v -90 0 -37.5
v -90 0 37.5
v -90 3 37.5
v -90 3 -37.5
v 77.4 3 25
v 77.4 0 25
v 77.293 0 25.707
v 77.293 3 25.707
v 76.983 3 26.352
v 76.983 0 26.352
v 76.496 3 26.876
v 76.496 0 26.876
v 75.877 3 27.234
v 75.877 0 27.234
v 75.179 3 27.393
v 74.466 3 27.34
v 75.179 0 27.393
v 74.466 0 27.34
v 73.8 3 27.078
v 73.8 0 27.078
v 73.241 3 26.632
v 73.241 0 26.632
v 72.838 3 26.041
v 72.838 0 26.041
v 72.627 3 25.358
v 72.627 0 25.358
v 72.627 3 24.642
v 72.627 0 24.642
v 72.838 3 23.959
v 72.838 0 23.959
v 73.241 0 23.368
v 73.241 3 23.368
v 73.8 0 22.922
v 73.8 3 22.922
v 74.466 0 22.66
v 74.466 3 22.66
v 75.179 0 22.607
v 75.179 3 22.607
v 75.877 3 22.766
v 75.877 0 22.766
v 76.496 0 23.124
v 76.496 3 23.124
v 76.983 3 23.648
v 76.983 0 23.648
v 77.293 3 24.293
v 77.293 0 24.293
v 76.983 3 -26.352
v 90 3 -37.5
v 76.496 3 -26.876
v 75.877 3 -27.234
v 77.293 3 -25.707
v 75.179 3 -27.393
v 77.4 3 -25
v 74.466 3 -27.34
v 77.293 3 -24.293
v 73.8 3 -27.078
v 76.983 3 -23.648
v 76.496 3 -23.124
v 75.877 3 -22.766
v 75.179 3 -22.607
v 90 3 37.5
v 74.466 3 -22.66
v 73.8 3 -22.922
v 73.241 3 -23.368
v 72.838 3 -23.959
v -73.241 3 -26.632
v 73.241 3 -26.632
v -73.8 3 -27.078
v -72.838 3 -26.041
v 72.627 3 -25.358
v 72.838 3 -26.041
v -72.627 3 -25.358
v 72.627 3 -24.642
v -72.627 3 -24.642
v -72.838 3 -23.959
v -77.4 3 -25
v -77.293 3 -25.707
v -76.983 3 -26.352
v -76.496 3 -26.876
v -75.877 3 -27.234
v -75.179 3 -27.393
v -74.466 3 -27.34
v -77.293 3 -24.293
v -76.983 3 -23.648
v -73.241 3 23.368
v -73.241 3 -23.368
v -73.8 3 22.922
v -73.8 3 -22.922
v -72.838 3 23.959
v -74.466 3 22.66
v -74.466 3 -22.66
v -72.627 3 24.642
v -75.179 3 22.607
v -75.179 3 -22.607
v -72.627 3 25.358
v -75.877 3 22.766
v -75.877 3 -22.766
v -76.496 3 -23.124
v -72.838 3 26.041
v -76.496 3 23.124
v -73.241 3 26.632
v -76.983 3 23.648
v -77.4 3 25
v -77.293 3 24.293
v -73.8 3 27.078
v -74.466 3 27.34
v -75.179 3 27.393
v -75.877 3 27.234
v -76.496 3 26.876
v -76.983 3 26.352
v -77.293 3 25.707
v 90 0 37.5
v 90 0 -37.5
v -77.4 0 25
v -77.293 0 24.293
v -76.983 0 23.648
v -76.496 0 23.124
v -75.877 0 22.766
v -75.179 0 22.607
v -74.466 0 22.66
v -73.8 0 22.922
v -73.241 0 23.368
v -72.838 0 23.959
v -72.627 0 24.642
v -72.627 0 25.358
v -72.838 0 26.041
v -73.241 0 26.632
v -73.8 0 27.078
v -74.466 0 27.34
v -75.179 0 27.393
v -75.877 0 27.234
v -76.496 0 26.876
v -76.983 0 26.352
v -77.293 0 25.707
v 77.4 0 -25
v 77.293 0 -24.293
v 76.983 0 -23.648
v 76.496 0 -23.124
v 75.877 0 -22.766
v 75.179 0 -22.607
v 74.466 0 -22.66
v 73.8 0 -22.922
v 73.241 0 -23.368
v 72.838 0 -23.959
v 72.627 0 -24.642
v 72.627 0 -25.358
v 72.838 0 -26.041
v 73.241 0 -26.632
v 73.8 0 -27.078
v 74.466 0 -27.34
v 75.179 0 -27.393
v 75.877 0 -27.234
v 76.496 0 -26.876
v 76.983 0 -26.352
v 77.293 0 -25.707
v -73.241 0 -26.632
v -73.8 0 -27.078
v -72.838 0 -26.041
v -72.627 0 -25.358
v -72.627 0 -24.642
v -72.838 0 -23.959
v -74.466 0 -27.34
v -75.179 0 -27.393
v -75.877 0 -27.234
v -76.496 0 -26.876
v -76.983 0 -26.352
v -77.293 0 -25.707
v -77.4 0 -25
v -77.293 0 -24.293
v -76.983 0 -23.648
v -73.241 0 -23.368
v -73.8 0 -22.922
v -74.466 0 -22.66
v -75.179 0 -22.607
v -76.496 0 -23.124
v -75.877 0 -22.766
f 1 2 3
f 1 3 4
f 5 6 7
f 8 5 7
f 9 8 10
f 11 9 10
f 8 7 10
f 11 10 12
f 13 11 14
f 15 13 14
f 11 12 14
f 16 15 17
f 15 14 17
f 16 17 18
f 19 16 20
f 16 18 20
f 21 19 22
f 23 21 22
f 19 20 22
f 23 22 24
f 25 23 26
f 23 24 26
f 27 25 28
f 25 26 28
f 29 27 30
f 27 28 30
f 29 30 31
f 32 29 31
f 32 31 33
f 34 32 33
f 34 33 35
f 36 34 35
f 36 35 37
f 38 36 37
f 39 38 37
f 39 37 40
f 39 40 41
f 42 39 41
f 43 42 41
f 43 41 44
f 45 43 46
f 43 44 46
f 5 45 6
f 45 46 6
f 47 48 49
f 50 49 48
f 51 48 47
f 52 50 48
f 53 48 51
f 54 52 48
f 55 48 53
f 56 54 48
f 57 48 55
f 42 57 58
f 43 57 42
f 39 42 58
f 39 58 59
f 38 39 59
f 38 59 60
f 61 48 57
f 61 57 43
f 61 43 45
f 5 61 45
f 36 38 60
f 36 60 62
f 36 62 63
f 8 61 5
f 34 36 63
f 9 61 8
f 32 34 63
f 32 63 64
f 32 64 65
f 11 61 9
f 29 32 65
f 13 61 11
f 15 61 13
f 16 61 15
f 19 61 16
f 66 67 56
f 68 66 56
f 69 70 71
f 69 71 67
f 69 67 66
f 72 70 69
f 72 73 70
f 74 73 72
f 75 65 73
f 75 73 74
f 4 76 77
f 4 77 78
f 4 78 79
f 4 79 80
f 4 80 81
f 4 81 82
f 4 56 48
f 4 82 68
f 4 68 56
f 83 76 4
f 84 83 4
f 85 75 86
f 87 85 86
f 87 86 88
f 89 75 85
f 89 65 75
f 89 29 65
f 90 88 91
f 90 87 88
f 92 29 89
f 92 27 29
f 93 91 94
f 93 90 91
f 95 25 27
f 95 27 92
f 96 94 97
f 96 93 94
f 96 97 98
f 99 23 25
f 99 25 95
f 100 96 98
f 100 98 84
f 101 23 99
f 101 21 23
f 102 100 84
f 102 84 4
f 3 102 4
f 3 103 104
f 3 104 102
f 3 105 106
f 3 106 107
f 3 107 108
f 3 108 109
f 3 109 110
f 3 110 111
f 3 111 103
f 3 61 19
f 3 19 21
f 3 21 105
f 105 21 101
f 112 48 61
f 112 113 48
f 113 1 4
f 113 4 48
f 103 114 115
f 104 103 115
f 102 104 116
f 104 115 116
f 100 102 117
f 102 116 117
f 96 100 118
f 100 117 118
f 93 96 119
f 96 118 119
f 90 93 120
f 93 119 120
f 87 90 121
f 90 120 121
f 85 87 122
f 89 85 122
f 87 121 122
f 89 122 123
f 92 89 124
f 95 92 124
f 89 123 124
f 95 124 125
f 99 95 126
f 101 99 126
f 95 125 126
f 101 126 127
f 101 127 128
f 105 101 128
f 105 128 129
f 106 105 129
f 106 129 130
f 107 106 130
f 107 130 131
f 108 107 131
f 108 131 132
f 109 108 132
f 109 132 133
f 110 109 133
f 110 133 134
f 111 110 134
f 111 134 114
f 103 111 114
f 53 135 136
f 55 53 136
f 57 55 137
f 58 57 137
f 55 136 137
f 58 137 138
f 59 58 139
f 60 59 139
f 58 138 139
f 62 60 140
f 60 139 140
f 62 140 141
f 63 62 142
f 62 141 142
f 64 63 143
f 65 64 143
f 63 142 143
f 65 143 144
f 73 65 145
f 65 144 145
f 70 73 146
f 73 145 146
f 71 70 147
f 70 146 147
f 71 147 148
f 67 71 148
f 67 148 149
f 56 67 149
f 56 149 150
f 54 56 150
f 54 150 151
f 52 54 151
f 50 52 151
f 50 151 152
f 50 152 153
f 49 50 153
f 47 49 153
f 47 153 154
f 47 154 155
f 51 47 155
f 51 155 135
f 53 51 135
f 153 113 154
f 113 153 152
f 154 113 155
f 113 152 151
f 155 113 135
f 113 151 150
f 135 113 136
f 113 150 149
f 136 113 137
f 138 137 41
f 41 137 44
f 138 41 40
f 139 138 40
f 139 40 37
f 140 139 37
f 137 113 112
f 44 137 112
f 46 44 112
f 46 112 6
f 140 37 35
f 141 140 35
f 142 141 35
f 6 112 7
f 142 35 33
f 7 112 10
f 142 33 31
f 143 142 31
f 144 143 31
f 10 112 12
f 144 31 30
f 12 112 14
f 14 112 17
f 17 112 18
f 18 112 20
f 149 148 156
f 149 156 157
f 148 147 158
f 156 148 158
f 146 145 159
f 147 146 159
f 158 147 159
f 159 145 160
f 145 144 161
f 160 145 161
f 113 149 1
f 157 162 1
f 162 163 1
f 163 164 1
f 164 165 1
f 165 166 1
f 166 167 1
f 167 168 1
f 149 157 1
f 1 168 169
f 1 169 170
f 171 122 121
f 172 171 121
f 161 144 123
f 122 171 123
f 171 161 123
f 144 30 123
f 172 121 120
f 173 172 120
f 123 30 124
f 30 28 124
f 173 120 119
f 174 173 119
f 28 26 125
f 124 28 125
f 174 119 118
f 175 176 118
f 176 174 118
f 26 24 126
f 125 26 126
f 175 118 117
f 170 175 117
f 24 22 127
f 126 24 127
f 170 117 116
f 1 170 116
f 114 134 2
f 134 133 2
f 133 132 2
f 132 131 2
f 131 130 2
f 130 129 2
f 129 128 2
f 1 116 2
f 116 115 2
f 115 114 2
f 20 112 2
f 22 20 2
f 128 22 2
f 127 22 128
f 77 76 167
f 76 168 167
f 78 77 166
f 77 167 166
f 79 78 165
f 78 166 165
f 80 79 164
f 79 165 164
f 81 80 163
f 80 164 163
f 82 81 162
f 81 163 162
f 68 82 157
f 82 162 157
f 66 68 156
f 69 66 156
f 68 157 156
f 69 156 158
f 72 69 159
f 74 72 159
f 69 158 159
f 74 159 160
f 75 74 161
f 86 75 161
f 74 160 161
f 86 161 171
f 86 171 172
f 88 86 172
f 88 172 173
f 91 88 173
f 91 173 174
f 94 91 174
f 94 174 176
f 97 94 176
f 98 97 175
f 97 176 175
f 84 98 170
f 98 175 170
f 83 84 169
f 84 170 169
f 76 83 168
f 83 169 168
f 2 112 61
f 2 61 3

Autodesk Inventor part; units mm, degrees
ref_plane "YZ Plane" through (0, 0, 0) normal (1, 0, 0) x (0, 1, 0)
ref_plane "XZ Plane" through (0, 0, 0) normal (0, 1, 0) x (-1, 0, 0)
ref_plane "XY Plane" through (0, 0, 0) normal (0, 0, 1) x (1, 0, 0)
sketch "Sketch1" plane through (0, 0, 0) normal (0, 1, 0) x (-1, 0, 0)
  line L0 (-90, 37.5) -> (90, 37.5)
  line L1 (90, 37.5) -> (90, -37.5)
  line L2 (90, -37.5) -> (-90, -37.5)
  line L3 (-90, -37.5) -> (-90, 37.5)
  line L4 (-90, 37.5) -> (90, -37.5) construction
  line L5 (90, 37.5) -> (-90, -37.5) construction
  point P0 (0, 0)
  dimension "d0" = 180
  dimension "d1" = 75
extrude "Extrusion1" add sketch "Sketch1" along normal blind 3
sketch "Sketch2" plane through (0, 0, 0) normal (0, -1, 0) x (1, 0, 0)
  circle A0 centre (75, 25) radius 2.4
  circle A1 centre (75, -25) radius 2.4
  circle A2 centre (97.5, 25) radius 2.7 projected
  circle A3 centre (97.5, -25) radius 2.7 projected
  line L0 (90, 37.5) -> (90, -37.5) projected
  point P0 (0, 0)
  dimension "d4" = 4.8
  dimension "d5" = 15
ref_plane "Work Plane1" through (0, 0, 37.5) normal (1, 0, 0) x (0, 0, -1)
extrude "Extrusion2" cut sketch "Sketch2" against normal through all contours A0 | A1
mirror "Mirror1" about plane through (0, 0, 37.5) normal (1, 0, 0) of "Extrusion2"
properties part number "Side Plane" material "Wood (Birch)"
